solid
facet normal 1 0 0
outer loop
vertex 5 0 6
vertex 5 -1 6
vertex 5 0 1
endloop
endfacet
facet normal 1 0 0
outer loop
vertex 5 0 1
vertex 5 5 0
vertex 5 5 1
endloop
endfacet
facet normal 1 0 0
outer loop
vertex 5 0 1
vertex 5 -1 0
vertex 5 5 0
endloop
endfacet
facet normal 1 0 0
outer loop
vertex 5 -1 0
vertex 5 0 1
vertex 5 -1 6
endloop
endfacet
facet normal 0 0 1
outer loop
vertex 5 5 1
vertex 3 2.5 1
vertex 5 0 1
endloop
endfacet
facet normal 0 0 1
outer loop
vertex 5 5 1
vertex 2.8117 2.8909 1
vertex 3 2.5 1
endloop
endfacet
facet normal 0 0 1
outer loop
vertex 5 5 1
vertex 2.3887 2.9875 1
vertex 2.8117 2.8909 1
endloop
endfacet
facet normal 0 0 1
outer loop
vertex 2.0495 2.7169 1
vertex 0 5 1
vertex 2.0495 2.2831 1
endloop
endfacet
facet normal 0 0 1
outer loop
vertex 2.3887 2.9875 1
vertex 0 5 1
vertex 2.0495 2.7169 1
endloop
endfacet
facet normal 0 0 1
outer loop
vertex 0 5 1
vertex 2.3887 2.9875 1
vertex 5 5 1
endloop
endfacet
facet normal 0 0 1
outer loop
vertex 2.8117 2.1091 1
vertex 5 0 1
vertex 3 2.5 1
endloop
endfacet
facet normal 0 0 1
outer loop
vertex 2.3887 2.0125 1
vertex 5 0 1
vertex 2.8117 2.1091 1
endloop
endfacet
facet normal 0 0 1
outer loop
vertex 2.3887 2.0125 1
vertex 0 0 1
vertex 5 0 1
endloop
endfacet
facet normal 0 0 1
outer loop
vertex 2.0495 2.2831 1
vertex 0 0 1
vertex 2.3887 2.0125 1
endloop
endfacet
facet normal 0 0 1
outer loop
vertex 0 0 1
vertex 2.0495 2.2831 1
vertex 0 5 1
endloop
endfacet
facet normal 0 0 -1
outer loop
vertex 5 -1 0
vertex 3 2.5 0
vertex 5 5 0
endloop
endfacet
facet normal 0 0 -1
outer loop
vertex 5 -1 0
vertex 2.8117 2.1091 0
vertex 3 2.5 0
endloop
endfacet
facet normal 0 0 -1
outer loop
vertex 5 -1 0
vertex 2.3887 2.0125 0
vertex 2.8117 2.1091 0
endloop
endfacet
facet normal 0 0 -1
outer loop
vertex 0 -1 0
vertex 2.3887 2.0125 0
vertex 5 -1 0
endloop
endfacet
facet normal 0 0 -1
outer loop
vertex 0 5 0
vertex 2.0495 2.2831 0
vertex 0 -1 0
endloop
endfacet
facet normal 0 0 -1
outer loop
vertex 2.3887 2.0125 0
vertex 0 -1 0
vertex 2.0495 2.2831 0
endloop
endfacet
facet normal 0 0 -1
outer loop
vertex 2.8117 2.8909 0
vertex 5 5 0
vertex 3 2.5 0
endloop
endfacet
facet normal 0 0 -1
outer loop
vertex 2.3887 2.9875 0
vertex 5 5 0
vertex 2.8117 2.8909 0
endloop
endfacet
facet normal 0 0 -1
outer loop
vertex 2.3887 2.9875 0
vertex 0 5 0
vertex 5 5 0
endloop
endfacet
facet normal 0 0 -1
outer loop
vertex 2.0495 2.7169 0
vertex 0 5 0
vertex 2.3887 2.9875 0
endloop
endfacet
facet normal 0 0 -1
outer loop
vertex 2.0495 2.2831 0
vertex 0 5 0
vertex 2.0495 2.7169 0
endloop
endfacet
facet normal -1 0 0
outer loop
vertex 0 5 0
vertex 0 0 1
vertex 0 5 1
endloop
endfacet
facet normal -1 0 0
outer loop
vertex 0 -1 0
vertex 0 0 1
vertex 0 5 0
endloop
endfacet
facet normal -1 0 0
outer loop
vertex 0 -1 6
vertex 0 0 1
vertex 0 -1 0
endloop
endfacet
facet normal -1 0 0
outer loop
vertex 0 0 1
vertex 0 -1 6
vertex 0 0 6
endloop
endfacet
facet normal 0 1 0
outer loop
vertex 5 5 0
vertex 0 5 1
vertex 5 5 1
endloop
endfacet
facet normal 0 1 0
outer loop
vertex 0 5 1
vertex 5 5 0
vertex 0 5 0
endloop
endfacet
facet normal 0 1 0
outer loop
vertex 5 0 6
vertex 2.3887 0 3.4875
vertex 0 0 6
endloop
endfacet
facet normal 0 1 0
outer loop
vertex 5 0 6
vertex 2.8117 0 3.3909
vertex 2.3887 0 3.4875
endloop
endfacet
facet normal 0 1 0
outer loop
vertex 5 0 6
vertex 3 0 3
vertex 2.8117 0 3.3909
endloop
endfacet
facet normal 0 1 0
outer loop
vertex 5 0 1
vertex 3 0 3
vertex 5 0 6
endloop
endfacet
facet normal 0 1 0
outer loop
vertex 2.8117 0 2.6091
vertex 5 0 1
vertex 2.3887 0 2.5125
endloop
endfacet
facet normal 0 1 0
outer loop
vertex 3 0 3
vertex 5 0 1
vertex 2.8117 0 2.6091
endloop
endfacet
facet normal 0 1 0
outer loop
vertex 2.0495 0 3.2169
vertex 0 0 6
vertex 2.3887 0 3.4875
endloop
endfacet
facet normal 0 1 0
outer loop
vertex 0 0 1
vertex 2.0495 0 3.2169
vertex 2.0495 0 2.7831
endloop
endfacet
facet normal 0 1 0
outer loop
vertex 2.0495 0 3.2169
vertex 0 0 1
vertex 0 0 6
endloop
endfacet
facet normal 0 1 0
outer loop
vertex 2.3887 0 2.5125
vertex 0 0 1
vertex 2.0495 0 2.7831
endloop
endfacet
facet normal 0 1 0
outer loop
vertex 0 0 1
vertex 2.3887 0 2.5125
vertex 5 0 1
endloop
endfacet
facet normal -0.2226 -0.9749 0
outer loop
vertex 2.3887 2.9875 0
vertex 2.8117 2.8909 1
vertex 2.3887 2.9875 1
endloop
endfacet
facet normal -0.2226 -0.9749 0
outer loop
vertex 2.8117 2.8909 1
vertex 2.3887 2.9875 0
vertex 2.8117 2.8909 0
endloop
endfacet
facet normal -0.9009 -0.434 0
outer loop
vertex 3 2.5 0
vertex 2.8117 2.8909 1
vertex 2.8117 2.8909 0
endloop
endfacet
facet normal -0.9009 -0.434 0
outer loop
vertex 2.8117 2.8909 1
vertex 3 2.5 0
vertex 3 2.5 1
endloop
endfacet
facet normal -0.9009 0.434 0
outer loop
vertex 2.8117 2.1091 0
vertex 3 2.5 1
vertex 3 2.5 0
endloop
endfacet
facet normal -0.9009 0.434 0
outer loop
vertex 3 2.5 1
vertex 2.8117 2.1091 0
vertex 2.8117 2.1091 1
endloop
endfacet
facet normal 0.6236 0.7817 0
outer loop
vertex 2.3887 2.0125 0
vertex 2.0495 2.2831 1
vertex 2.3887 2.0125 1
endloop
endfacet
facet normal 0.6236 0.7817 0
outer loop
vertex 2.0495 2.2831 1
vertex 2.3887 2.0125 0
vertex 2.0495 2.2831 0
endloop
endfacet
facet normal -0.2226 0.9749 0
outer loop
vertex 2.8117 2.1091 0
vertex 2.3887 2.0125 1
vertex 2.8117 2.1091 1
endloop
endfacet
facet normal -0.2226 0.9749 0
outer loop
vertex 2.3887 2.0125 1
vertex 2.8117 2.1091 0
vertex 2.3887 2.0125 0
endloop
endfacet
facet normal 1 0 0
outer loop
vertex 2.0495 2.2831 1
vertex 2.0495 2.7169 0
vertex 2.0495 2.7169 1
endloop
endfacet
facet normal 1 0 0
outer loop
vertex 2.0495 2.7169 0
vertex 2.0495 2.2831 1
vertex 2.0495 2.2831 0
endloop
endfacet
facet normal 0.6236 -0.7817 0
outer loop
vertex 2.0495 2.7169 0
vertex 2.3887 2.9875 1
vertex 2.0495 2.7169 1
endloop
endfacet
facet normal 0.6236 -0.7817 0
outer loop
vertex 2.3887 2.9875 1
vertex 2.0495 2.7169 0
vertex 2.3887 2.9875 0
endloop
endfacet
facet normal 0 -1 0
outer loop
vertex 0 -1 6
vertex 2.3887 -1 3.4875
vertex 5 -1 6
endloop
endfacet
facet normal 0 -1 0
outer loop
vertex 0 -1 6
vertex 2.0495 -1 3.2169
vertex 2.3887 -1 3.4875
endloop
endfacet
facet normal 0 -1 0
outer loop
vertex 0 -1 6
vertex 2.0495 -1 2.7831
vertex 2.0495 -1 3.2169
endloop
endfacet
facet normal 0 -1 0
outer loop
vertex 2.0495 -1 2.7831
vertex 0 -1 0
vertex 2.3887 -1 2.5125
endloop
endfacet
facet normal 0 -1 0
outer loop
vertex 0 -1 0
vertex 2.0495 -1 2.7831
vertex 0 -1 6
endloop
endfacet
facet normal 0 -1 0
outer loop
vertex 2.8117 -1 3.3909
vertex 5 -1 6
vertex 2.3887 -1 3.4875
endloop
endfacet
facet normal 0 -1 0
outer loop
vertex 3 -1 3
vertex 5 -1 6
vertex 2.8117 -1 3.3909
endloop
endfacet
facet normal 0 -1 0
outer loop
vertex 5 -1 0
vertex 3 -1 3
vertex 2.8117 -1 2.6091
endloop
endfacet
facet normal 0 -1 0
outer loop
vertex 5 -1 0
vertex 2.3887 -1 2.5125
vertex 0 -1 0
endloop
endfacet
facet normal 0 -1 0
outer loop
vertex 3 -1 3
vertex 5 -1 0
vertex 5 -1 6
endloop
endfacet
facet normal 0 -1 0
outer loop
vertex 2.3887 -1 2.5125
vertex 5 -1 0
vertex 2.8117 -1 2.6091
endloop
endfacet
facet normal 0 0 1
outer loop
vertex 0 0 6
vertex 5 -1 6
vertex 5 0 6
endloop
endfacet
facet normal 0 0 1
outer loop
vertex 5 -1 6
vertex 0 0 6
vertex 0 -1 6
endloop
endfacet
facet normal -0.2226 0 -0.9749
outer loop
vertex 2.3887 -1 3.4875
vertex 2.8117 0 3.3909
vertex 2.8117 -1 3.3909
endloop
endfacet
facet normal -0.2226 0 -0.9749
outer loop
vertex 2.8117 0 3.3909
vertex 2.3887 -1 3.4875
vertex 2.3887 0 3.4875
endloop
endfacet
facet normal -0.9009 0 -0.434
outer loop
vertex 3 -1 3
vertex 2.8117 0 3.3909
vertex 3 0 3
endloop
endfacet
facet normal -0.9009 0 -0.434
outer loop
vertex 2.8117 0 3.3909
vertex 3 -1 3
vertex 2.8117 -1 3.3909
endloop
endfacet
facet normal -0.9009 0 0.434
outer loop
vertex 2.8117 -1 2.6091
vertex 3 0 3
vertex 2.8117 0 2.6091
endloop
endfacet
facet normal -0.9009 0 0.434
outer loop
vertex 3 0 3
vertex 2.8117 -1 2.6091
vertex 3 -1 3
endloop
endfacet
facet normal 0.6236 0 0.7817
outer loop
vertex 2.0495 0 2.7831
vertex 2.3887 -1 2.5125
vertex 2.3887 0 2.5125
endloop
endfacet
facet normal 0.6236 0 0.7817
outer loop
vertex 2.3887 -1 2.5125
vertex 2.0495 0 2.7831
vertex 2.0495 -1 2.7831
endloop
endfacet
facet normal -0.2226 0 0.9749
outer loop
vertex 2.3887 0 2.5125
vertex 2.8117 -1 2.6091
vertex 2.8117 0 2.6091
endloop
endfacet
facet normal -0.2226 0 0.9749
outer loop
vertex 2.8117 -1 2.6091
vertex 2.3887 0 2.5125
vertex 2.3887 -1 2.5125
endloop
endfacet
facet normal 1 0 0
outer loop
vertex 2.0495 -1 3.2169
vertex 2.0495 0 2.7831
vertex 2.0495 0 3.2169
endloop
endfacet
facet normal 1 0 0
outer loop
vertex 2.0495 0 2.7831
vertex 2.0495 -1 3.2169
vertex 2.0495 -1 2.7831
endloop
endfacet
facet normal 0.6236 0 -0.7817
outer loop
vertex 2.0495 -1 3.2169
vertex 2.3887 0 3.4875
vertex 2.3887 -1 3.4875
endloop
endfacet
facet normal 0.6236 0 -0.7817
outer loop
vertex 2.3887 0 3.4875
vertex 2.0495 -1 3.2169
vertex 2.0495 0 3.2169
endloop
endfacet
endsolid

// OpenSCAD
$fa=1; 
$fs=0.5;


module prato( length, width, thickness ){
    difference(){
        cube( [ length, width, thickness ] );
        translate([ length / 2 , width / 2 , - 0.5 ]){
            #cylinder ( r =  length / 10 , h = thickness +1 );
        }
    }
} 

module cantoneira ( length, width, thickness ){
    prato( length, width, thickness );
    rotate ( a = 90 , v = [ 1 , 0 , 0 ]){
        prato( length, width + thickness , thickness );
    }
}
cantoneira( 5 , 5 , 1);
